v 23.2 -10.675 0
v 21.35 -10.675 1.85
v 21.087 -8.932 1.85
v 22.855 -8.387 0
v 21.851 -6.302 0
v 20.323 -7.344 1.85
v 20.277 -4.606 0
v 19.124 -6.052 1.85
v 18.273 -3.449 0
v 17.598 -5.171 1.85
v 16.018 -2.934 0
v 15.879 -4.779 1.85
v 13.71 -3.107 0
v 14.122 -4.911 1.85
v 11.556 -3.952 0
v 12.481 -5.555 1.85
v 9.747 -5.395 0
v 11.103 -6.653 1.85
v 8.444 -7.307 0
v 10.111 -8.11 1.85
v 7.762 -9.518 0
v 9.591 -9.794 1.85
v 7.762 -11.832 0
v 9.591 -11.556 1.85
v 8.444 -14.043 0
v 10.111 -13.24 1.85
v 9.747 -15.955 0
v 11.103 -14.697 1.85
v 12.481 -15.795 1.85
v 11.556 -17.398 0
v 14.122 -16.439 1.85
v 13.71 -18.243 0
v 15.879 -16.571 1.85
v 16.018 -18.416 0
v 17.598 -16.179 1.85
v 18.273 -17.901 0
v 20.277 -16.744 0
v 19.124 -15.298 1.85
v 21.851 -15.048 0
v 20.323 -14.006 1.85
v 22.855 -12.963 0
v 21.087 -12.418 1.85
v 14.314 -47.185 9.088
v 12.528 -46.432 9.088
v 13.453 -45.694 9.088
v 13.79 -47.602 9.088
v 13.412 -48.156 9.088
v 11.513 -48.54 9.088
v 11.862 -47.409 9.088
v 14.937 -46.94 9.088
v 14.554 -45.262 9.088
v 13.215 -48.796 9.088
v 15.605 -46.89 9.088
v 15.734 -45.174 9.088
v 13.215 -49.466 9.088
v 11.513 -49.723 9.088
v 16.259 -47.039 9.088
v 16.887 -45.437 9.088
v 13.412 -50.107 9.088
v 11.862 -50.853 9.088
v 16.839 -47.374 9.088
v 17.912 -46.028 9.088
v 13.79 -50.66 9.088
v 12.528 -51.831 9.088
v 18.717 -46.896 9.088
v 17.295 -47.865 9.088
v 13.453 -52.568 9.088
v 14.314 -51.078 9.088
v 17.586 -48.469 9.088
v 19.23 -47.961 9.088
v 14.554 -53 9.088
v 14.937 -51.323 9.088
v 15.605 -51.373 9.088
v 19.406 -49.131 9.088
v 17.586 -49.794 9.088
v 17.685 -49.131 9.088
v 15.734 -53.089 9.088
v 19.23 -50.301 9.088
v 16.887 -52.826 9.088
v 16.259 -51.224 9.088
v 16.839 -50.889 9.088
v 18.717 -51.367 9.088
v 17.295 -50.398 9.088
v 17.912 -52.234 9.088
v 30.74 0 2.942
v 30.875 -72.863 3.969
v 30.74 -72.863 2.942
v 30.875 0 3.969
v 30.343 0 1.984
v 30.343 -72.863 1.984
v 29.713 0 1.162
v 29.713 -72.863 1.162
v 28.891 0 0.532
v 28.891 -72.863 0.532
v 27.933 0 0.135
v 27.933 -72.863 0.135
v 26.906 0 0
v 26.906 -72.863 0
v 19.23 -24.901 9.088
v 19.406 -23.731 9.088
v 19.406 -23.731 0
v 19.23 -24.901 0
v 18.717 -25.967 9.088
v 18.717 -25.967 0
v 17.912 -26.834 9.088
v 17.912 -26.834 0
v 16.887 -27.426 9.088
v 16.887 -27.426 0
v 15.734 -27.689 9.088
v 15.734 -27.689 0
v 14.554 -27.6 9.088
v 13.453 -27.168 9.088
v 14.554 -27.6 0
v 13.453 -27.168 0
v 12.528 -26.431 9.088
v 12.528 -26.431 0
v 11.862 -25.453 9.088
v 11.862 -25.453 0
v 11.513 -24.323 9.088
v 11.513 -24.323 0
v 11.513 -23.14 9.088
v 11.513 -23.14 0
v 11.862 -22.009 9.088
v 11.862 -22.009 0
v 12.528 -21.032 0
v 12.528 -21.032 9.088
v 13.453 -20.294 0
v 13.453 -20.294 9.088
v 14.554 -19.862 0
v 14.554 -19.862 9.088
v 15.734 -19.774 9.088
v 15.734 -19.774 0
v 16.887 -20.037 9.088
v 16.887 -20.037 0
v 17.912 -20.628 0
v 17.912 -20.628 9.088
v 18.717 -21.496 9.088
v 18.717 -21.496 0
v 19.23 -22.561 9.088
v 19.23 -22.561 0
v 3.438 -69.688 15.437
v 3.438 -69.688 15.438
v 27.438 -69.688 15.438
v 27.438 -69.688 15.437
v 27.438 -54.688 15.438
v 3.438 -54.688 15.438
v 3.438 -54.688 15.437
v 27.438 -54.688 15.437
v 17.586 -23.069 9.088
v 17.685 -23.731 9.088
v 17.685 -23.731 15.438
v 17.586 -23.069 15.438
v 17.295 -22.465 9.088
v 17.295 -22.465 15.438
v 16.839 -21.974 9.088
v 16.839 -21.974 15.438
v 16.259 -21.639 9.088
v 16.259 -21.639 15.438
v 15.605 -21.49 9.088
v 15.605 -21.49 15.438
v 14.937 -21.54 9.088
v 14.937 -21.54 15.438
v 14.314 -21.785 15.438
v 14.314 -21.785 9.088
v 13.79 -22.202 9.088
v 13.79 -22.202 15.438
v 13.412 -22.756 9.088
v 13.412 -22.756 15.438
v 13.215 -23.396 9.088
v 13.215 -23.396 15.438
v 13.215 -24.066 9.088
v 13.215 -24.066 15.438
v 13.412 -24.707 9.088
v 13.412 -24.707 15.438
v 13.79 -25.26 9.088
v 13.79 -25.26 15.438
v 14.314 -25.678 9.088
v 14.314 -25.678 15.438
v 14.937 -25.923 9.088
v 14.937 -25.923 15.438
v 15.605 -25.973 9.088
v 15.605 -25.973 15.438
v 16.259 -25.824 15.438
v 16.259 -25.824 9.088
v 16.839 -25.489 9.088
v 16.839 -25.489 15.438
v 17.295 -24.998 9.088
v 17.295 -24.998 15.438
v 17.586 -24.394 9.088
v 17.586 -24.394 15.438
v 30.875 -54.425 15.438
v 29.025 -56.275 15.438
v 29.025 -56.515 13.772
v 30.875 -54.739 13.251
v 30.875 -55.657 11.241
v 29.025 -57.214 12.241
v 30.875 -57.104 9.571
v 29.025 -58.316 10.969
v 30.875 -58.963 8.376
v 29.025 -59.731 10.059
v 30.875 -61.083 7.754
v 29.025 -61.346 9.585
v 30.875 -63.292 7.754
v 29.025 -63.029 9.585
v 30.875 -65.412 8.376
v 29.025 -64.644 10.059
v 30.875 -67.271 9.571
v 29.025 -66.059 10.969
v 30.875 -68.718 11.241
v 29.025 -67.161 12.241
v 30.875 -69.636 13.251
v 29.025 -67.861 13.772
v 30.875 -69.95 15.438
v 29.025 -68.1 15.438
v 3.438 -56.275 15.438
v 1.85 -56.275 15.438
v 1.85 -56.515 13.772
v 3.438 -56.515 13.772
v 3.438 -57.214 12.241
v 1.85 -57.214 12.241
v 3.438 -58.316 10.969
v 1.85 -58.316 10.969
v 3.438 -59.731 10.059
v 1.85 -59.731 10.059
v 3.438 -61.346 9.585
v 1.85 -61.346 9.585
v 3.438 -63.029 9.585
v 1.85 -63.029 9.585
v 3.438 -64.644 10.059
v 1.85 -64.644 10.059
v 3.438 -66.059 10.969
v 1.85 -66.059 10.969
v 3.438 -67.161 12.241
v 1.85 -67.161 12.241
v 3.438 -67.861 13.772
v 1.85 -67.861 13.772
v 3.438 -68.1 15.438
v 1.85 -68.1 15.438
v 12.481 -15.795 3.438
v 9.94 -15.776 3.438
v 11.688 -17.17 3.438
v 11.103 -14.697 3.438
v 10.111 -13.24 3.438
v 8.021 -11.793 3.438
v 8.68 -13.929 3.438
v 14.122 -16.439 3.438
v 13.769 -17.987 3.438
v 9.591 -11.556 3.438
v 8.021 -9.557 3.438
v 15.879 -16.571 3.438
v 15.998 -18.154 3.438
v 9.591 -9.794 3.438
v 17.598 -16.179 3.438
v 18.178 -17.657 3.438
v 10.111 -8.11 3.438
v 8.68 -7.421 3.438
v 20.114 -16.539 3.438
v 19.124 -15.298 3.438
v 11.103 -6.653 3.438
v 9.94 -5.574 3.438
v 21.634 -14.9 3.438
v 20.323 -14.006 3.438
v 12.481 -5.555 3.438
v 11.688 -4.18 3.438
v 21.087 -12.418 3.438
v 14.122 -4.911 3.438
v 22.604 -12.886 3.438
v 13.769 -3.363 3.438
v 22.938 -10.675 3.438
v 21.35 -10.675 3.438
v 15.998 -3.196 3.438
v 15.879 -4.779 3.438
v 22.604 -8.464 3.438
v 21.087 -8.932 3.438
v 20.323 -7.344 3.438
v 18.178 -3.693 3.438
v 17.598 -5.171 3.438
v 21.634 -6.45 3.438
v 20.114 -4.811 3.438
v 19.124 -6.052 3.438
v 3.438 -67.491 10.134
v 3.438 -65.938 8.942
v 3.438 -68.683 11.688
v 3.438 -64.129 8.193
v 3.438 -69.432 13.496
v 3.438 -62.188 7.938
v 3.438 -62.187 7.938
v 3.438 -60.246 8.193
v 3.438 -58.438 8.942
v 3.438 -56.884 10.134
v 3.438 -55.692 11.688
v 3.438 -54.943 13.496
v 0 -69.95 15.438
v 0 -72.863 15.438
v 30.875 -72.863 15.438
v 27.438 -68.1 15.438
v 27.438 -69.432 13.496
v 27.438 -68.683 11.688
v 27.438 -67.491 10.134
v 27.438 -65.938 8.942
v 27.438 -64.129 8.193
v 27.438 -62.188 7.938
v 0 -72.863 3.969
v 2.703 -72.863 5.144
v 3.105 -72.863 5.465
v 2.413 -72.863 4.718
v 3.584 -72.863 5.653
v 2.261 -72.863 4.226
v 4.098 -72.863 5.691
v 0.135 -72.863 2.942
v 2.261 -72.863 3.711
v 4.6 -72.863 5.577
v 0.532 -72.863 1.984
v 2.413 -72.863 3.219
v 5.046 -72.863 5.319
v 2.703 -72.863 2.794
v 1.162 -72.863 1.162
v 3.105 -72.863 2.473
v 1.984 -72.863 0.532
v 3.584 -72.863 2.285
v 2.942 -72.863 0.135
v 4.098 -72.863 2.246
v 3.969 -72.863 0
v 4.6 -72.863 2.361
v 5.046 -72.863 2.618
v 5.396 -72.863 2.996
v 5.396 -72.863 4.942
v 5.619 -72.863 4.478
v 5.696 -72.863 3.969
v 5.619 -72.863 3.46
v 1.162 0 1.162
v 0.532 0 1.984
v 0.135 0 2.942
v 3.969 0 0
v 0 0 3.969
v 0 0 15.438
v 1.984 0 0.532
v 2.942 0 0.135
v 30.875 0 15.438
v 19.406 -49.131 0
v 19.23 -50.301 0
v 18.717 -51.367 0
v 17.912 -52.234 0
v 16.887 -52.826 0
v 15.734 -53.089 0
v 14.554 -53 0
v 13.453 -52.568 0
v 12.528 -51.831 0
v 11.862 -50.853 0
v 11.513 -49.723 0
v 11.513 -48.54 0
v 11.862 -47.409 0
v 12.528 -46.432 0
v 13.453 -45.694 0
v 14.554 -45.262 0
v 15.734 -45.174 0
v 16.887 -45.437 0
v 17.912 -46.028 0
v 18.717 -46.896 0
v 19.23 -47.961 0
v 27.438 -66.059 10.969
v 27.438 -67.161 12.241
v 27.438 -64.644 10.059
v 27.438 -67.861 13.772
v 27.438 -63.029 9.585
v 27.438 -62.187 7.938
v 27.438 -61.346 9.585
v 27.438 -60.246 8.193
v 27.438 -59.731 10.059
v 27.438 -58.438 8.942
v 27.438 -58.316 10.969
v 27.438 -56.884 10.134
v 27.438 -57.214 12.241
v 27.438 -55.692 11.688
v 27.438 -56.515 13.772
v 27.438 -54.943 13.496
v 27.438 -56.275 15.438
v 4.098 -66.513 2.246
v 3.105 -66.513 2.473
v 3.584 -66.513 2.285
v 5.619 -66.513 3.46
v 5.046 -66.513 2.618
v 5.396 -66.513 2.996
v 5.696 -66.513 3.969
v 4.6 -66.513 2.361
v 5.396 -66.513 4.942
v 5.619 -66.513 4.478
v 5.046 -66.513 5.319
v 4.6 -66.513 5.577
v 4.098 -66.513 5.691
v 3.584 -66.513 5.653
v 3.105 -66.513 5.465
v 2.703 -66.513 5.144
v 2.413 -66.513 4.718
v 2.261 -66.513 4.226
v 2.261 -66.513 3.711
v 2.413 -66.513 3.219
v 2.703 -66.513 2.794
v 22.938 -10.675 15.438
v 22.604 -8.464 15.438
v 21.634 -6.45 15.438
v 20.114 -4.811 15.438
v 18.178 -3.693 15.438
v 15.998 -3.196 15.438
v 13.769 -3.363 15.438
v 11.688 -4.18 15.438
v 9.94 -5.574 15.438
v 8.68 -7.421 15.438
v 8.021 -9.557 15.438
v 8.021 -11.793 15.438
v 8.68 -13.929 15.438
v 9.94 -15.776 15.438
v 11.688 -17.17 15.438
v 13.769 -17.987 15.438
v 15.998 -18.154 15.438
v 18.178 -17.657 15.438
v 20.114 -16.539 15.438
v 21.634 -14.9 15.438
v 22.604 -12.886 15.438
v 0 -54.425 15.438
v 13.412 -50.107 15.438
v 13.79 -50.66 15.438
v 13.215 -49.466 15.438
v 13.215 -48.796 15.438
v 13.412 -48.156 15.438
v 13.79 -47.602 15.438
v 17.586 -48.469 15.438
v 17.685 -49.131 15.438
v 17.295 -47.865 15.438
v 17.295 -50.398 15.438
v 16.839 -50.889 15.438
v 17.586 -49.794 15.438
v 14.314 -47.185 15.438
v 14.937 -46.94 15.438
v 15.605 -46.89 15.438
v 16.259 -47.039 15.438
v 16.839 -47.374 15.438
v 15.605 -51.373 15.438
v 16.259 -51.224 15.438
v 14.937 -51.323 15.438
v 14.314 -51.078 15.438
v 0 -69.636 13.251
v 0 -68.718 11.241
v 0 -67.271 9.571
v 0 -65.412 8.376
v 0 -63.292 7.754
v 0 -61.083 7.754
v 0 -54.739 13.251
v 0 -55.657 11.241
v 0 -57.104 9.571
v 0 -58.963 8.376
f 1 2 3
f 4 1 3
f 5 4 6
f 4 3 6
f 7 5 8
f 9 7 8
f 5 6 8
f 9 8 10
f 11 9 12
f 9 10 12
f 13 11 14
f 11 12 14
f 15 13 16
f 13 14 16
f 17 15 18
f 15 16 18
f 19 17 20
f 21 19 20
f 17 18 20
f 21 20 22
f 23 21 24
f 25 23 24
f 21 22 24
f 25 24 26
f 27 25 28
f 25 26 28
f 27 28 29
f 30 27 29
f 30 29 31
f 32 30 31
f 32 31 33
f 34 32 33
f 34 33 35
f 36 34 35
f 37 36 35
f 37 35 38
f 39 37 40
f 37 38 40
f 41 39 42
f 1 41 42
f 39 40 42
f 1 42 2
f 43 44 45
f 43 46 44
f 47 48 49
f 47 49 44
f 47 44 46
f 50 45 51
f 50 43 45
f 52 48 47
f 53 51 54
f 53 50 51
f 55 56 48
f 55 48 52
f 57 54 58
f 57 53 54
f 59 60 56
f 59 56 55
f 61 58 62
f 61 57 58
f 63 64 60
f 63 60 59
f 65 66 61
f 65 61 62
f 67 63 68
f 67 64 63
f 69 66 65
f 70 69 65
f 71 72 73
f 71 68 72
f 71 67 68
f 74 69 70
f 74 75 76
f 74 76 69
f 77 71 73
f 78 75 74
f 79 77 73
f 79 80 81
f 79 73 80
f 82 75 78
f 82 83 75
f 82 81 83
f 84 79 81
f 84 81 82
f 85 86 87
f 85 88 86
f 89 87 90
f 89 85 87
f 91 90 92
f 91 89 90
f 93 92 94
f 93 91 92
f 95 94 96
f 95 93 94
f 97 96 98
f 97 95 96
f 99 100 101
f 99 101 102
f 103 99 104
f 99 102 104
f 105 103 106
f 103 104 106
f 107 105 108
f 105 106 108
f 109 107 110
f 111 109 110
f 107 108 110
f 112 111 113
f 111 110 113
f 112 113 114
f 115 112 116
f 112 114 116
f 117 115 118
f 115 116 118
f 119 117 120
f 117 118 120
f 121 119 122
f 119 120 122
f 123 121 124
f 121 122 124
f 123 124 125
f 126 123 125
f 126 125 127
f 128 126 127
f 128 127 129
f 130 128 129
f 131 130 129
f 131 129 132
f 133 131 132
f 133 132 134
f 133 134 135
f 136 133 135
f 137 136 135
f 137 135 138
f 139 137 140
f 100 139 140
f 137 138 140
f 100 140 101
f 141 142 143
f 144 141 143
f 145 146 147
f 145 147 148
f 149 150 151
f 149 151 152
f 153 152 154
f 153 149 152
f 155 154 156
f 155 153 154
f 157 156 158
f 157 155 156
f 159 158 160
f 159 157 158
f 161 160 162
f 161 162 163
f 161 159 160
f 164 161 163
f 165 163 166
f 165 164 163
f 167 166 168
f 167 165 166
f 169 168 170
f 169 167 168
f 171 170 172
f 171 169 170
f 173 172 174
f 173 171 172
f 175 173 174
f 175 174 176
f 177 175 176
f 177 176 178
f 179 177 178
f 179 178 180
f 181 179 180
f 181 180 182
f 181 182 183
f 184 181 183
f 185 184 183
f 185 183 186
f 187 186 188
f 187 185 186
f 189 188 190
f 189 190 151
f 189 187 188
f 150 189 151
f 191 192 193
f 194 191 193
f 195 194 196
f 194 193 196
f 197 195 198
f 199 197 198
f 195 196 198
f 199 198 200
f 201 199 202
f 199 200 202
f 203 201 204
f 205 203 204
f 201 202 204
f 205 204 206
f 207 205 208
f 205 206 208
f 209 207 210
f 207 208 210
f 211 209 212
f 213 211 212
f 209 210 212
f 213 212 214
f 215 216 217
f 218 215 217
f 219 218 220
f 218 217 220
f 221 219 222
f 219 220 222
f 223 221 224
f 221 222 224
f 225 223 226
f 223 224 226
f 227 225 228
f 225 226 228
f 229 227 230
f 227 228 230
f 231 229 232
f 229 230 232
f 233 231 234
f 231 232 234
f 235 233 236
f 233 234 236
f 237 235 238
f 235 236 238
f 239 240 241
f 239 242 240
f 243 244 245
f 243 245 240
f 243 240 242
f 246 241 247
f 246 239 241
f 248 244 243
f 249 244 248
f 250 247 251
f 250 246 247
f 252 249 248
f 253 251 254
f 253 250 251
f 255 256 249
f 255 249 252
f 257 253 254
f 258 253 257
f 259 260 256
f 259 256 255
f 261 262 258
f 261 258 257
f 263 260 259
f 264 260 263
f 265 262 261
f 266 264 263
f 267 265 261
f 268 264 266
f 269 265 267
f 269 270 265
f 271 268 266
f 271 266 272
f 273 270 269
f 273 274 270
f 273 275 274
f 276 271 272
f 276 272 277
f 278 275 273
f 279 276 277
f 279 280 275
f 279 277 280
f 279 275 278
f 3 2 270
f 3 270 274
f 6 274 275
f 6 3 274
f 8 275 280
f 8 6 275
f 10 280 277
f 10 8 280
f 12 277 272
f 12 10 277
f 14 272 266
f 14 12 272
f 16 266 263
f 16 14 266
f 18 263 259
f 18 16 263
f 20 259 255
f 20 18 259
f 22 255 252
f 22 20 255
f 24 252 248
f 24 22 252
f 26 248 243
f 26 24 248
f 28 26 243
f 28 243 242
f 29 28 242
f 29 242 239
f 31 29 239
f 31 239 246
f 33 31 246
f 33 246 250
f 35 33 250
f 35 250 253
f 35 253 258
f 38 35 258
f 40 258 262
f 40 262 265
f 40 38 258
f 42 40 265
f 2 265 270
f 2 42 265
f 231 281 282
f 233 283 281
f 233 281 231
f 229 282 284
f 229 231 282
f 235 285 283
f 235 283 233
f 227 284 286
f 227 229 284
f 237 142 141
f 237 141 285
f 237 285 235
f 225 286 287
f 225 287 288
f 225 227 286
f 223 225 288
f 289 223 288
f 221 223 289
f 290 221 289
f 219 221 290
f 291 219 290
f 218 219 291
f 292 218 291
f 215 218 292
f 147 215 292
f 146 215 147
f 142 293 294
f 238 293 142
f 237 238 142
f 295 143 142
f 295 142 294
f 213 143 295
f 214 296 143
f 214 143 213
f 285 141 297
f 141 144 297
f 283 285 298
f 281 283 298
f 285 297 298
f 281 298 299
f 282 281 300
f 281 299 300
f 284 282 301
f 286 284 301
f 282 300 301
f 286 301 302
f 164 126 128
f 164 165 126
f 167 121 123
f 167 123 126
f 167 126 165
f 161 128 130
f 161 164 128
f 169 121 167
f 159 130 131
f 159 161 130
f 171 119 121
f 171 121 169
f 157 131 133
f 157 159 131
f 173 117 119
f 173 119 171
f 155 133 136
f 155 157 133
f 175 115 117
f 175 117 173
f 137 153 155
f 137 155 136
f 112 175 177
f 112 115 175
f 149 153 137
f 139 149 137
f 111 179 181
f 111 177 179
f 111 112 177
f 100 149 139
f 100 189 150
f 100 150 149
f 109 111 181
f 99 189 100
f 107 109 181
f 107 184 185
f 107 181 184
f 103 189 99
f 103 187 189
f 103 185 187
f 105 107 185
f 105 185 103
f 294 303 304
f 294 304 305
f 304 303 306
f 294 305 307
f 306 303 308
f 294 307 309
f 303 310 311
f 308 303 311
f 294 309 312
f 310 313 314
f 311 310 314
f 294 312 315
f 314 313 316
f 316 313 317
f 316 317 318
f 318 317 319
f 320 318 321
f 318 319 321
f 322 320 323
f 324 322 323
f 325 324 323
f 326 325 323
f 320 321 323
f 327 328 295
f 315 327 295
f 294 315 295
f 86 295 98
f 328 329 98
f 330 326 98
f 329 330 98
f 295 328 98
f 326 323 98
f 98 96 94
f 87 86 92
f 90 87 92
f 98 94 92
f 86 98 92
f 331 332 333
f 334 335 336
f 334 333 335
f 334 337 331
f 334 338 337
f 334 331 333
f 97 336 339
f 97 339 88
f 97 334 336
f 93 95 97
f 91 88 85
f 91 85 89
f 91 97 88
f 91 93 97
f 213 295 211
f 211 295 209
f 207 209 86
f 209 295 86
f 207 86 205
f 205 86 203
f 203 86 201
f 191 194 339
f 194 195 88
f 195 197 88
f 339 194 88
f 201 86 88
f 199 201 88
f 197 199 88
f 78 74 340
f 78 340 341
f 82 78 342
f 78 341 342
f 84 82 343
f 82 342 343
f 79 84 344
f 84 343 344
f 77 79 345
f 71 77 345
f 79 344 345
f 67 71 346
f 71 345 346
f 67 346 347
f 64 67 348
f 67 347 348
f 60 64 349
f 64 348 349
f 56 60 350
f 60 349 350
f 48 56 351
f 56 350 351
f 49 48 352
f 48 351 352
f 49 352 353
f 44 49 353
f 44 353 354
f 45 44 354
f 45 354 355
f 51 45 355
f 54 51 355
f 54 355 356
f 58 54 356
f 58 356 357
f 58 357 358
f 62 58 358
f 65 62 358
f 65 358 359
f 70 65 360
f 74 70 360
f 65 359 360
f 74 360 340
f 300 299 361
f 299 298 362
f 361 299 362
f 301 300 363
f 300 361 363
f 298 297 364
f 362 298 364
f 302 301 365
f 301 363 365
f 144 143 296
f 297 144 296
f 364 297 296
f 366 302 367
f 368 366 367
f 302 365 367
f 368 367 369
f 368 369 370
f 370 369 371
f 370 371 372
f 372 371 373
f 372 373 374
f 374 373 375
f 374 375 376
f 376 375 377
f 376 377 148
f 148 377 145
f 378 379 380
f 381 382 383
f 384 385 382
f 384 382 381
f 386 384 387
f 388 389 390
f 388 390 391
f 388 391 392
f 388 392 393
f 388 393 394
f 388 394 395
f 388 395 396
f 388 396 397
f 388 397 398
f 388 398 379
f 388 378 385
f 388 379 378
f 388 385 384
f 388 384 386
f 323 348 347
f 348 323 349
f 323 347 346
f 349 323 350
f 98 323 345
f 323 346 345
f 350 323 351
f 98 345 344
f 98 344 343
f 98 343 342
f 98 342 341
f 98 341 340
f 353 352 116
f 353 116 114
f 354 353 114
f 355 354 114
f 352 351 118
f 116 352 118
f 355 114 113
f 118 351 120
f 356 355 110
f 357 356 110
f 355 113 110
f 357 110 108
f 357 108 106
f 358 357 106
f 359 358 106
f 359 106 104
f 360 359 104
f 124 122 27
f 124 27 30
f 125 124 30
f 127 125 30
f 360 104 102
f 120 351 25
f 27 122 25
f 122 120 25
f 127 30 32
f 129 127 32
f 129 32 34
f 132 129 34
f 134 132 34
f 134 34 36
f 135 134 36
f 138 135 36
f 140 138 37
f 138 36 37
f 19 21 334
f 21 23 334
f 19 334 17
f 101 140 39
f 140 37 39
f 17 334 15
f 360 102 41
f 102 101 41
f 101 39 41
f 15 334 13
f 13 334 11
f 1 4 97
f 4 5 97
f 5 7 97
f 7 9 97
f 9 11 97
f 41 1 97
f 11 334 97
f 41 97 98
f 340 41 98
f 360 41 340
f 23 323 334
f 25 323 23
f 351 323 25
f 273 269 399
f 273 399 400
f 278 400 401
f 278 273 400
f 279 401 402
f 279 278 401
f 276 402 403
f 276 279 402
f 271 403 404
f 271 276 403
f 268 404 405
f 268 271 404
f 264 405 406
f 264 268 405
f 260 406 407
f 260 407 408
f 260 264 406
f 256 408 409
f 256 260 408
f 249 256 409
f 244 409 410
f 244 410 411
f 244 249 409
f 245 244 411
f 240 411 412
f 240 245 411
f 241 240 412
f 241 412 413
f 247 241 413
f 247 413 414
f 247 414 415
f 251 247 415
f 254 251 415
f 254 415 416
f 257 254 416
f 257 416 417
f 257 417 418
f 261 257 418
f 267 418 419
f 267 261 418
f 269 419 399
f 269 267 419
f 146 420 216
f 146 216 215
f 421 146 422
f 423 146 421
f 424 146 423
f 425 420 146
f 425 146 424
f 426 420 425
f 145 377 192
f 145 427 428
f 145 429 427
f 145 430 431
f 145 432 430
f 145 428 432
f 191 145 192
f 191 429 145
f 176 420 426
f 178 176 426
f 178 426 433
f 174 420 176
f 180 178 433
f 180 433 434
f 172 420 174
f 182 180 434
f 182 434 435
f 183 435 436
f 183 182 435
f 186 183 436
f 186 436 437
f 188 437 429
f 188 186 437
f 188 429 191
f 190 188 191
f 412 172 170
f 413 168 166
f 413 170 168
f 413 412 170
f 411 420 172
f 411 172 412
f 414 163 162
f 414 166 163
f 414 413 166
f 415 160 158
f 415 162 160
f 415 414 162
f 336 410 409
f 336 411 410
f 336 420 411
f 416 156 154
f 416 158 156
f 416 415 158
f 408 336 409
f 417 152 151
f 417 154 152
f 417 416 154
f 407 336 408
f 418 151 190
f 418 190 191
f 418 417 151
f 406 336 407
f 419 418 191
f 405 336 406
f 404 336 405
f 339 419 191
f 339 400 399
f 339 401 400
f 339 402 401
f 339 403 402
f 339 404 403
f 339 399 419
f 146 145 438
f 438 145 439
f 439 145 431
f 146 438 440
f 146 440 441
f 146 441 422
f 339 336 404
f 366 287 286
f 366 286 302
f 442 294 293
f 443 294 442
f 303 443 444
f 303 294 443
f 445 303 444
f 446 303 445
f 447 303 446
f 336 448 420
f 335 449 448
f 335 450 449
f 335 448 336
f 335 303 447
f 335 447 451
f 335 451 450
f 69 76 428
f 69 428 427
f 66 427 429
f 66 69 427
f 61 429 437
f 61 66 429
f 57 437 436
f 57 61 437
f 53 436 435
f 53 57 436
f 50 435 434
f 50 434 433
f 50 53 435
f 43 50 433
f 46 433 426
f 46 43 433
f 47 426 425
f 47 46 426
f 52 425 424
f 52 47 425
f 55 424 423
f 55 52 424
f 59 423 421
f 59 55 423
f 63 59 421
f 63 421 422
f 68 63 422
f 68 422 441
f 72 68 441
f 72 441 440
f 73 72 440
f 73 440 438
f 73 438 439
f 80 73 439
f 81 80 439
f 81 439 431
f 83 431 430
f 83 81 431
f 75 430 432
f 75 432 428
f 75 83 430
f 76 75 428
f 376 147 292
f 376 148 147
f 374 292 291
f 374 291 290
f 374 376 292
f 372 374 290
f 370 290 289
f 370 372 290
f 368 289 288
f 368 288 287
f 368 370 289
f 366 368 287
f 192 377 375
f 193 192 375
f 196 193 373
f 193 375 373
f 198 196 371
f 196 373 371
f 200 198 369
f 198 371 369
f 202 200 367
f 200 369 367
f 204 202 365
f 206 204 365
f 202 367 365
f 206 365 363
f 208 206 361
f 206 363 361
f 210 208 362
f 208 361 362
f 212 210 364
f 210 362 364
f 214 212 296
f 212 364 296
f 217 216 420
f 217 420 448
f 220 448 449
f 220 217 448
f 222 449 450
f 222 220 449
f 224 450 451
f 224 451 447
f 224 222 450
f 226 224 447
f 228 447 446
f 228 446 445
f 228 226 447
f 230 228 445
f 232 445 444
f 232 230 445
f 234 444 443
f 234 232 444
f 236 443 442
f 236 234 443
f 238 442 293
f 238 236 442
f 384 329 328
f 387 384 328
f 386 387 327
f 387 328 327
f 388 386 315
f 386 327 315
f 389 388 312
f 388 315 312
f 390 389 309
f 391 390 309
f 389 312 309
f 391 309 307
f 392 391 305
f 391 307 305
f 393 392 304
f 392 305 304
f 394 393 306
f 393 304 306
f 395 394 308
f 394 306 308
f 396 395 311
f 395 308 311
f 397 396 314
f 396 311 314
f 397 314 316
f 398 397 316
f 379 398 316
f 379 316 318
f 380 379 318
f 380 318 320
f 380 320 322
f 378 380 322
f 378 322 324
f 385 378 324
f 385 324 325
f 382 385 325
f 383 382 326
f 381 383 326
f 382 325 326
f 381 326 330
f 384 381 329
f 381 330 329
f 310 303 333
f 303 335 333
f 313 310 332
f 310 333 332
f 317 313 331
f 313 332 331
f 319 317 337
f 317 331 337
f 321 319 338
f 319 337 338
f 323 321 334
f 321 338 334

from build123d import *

# Parameters (mm, degrees)
F0_W      = 30.8750208
F0_H      = 72.8625058
F0_R      = 2.2479
F0_R_2    = 5.9124977
F1_DEPTH  = 3.437509
F2_W      = 30.8750208
F2_H      = 72.8625058
F2_R      = 2.2479
F2_R_2    = 7.5
F3_DEPTH  = 12
F4_W      = 24
F4_H      = 15
F5_DEPTH  = 7.5
F6_R      = 7.49999
F8_DEPTH  = 30.8750208
F9_R      = 3.96875
F10_DEPTH = 9.0875104
F11_R     = 3.96875
F12_R     = 1.7272
F13_DEPTH = 6.35
F14_SIZE  = 1.850009


# Not quite as in the source:
# - a fillet or chamfer is up to 0.001 mm smaller than in the source, because OpenCascade refuses the exact size


with BuildPart() as f1:
    # F0 (on Top) → F1 (new body)
    with BuildSketch(Plane.XY):
        with Locations((15.4375104, -36.4312529)):
            Rectangle(F0_W, F0_H)
        with Locations((15.4375104, -49.1312477)):
            Circle(F0_R, mode=Mode.SUBTRACT)
        with Locations((15.4375104, -23.7312477)):
            Circle(F0_R, mode=Mode.SUBTRACT)
        with Locations((15.4375104, -10.6749977)):
            Circle(F0_R_2, mode=Mode.SUBTRACT)
    extrude(amount=F1_DEPTH)

    # F2 (on face) → F3 (join)
    with BuildSketch(Plane.XY.offset(3.437509)):
        with Locations((15.4375104, -36.4312529)):
            Rectangle(F2_W, F2_H)
        with Locations((15.4375104, -49.1312477)):
            Circle(F2_R, mode=Mode.SUBTRACT)
        with Locations((15.4375104, -23.7312477)):
            Circle(F2_R, mode=Mode.SUBTRACT)
        with Locations((15.4375104, -10.6749977)):
            Circle(F2_R_2, mode=Mode.SUBTRACT)
    extrude(amount=F3_DEPTH)

    # F4 (on face) → F5 (cut)
    with BuildSketch(Plane.XY.offset(15.437509)):
        with Locations((15.4375104, -62.1875058)):
            Rectangle(F4_W, F4_H)
    extrude(amount=-F5_DEPTH, mode=Mode.SUBTRACT)

    # F6 (radius 7.5 in the source; OpenCascade refuses exactly that, so slightly less here)
    f6_edges = [f1.edges().sort_by_distance(p)[0] for p in [
        (15.43751, -54.687506, 7.937509),
        (15.43751, -69.687506, 7.937509),
    ]]
    fillet(f6_edges, radius=F6_R)

    # F7 (on face) → F8 (cut, through all)
    with BuildSketch(Plane(origin=(0, 0, 0), x_dir=(0, -1, 0), z_dir=(-1, 0, 0))):
        with BuildLine():
            Line((68.1000035, 15.437509), (56.2750081, 15.437509))
            ThreePointArc((56.2750081, 15.437509), (62.1875058, 9.5250113), (68.1000035, 15.437509))
        make_face()
    extrude(amount=-F8_DEPTH, mode=Mode.SUBTRACT)

    # F9 (on face) → F10 (cut)
    with BuildSketch(Plane(origin=(0, 0, 0), x_dir=(1, 0, 0), z_dir=(0, 0, -1))):
        with Locations((15.4375104, 23.7312477)):
            Circle(F9_R)
        with Locations((15.4375104, 49.1312477)):
            Circle(F9_R)
    extrude(amount=-F10_DEPTH, mode=Mode.SUBTRACT)

    # F11
    f11_edges = [f1.edges().sort_by_distance(p)[0] for p in [
        (0, -36.431253, 0),
        (30.875021, -36.431253, 0),
    ]]
    fillet(f11_edges, radius=F11_R)

    # F12 (on face) → F13 (cut)
    with BuildSketch(Plane.XZ.offset(72.8625058)):
        with Locations((3.96875, 3.96875)):
            Circle(F12_R)
    extrude(amount=-F13_DEPTH, mode=Mode.SUBTRACT)

    # F14
    f14_edges = [f1.edges().sort_by_distance(p)[0] for p in [
        (9.525013, -10.674998, 0),
        (30.875021, -62.187506, 9.525011),
        (0, -62.187506, 9.525011),
    ]]
    chamfer(f14_edges, length=F14_SIZE)


solid = f1.part
